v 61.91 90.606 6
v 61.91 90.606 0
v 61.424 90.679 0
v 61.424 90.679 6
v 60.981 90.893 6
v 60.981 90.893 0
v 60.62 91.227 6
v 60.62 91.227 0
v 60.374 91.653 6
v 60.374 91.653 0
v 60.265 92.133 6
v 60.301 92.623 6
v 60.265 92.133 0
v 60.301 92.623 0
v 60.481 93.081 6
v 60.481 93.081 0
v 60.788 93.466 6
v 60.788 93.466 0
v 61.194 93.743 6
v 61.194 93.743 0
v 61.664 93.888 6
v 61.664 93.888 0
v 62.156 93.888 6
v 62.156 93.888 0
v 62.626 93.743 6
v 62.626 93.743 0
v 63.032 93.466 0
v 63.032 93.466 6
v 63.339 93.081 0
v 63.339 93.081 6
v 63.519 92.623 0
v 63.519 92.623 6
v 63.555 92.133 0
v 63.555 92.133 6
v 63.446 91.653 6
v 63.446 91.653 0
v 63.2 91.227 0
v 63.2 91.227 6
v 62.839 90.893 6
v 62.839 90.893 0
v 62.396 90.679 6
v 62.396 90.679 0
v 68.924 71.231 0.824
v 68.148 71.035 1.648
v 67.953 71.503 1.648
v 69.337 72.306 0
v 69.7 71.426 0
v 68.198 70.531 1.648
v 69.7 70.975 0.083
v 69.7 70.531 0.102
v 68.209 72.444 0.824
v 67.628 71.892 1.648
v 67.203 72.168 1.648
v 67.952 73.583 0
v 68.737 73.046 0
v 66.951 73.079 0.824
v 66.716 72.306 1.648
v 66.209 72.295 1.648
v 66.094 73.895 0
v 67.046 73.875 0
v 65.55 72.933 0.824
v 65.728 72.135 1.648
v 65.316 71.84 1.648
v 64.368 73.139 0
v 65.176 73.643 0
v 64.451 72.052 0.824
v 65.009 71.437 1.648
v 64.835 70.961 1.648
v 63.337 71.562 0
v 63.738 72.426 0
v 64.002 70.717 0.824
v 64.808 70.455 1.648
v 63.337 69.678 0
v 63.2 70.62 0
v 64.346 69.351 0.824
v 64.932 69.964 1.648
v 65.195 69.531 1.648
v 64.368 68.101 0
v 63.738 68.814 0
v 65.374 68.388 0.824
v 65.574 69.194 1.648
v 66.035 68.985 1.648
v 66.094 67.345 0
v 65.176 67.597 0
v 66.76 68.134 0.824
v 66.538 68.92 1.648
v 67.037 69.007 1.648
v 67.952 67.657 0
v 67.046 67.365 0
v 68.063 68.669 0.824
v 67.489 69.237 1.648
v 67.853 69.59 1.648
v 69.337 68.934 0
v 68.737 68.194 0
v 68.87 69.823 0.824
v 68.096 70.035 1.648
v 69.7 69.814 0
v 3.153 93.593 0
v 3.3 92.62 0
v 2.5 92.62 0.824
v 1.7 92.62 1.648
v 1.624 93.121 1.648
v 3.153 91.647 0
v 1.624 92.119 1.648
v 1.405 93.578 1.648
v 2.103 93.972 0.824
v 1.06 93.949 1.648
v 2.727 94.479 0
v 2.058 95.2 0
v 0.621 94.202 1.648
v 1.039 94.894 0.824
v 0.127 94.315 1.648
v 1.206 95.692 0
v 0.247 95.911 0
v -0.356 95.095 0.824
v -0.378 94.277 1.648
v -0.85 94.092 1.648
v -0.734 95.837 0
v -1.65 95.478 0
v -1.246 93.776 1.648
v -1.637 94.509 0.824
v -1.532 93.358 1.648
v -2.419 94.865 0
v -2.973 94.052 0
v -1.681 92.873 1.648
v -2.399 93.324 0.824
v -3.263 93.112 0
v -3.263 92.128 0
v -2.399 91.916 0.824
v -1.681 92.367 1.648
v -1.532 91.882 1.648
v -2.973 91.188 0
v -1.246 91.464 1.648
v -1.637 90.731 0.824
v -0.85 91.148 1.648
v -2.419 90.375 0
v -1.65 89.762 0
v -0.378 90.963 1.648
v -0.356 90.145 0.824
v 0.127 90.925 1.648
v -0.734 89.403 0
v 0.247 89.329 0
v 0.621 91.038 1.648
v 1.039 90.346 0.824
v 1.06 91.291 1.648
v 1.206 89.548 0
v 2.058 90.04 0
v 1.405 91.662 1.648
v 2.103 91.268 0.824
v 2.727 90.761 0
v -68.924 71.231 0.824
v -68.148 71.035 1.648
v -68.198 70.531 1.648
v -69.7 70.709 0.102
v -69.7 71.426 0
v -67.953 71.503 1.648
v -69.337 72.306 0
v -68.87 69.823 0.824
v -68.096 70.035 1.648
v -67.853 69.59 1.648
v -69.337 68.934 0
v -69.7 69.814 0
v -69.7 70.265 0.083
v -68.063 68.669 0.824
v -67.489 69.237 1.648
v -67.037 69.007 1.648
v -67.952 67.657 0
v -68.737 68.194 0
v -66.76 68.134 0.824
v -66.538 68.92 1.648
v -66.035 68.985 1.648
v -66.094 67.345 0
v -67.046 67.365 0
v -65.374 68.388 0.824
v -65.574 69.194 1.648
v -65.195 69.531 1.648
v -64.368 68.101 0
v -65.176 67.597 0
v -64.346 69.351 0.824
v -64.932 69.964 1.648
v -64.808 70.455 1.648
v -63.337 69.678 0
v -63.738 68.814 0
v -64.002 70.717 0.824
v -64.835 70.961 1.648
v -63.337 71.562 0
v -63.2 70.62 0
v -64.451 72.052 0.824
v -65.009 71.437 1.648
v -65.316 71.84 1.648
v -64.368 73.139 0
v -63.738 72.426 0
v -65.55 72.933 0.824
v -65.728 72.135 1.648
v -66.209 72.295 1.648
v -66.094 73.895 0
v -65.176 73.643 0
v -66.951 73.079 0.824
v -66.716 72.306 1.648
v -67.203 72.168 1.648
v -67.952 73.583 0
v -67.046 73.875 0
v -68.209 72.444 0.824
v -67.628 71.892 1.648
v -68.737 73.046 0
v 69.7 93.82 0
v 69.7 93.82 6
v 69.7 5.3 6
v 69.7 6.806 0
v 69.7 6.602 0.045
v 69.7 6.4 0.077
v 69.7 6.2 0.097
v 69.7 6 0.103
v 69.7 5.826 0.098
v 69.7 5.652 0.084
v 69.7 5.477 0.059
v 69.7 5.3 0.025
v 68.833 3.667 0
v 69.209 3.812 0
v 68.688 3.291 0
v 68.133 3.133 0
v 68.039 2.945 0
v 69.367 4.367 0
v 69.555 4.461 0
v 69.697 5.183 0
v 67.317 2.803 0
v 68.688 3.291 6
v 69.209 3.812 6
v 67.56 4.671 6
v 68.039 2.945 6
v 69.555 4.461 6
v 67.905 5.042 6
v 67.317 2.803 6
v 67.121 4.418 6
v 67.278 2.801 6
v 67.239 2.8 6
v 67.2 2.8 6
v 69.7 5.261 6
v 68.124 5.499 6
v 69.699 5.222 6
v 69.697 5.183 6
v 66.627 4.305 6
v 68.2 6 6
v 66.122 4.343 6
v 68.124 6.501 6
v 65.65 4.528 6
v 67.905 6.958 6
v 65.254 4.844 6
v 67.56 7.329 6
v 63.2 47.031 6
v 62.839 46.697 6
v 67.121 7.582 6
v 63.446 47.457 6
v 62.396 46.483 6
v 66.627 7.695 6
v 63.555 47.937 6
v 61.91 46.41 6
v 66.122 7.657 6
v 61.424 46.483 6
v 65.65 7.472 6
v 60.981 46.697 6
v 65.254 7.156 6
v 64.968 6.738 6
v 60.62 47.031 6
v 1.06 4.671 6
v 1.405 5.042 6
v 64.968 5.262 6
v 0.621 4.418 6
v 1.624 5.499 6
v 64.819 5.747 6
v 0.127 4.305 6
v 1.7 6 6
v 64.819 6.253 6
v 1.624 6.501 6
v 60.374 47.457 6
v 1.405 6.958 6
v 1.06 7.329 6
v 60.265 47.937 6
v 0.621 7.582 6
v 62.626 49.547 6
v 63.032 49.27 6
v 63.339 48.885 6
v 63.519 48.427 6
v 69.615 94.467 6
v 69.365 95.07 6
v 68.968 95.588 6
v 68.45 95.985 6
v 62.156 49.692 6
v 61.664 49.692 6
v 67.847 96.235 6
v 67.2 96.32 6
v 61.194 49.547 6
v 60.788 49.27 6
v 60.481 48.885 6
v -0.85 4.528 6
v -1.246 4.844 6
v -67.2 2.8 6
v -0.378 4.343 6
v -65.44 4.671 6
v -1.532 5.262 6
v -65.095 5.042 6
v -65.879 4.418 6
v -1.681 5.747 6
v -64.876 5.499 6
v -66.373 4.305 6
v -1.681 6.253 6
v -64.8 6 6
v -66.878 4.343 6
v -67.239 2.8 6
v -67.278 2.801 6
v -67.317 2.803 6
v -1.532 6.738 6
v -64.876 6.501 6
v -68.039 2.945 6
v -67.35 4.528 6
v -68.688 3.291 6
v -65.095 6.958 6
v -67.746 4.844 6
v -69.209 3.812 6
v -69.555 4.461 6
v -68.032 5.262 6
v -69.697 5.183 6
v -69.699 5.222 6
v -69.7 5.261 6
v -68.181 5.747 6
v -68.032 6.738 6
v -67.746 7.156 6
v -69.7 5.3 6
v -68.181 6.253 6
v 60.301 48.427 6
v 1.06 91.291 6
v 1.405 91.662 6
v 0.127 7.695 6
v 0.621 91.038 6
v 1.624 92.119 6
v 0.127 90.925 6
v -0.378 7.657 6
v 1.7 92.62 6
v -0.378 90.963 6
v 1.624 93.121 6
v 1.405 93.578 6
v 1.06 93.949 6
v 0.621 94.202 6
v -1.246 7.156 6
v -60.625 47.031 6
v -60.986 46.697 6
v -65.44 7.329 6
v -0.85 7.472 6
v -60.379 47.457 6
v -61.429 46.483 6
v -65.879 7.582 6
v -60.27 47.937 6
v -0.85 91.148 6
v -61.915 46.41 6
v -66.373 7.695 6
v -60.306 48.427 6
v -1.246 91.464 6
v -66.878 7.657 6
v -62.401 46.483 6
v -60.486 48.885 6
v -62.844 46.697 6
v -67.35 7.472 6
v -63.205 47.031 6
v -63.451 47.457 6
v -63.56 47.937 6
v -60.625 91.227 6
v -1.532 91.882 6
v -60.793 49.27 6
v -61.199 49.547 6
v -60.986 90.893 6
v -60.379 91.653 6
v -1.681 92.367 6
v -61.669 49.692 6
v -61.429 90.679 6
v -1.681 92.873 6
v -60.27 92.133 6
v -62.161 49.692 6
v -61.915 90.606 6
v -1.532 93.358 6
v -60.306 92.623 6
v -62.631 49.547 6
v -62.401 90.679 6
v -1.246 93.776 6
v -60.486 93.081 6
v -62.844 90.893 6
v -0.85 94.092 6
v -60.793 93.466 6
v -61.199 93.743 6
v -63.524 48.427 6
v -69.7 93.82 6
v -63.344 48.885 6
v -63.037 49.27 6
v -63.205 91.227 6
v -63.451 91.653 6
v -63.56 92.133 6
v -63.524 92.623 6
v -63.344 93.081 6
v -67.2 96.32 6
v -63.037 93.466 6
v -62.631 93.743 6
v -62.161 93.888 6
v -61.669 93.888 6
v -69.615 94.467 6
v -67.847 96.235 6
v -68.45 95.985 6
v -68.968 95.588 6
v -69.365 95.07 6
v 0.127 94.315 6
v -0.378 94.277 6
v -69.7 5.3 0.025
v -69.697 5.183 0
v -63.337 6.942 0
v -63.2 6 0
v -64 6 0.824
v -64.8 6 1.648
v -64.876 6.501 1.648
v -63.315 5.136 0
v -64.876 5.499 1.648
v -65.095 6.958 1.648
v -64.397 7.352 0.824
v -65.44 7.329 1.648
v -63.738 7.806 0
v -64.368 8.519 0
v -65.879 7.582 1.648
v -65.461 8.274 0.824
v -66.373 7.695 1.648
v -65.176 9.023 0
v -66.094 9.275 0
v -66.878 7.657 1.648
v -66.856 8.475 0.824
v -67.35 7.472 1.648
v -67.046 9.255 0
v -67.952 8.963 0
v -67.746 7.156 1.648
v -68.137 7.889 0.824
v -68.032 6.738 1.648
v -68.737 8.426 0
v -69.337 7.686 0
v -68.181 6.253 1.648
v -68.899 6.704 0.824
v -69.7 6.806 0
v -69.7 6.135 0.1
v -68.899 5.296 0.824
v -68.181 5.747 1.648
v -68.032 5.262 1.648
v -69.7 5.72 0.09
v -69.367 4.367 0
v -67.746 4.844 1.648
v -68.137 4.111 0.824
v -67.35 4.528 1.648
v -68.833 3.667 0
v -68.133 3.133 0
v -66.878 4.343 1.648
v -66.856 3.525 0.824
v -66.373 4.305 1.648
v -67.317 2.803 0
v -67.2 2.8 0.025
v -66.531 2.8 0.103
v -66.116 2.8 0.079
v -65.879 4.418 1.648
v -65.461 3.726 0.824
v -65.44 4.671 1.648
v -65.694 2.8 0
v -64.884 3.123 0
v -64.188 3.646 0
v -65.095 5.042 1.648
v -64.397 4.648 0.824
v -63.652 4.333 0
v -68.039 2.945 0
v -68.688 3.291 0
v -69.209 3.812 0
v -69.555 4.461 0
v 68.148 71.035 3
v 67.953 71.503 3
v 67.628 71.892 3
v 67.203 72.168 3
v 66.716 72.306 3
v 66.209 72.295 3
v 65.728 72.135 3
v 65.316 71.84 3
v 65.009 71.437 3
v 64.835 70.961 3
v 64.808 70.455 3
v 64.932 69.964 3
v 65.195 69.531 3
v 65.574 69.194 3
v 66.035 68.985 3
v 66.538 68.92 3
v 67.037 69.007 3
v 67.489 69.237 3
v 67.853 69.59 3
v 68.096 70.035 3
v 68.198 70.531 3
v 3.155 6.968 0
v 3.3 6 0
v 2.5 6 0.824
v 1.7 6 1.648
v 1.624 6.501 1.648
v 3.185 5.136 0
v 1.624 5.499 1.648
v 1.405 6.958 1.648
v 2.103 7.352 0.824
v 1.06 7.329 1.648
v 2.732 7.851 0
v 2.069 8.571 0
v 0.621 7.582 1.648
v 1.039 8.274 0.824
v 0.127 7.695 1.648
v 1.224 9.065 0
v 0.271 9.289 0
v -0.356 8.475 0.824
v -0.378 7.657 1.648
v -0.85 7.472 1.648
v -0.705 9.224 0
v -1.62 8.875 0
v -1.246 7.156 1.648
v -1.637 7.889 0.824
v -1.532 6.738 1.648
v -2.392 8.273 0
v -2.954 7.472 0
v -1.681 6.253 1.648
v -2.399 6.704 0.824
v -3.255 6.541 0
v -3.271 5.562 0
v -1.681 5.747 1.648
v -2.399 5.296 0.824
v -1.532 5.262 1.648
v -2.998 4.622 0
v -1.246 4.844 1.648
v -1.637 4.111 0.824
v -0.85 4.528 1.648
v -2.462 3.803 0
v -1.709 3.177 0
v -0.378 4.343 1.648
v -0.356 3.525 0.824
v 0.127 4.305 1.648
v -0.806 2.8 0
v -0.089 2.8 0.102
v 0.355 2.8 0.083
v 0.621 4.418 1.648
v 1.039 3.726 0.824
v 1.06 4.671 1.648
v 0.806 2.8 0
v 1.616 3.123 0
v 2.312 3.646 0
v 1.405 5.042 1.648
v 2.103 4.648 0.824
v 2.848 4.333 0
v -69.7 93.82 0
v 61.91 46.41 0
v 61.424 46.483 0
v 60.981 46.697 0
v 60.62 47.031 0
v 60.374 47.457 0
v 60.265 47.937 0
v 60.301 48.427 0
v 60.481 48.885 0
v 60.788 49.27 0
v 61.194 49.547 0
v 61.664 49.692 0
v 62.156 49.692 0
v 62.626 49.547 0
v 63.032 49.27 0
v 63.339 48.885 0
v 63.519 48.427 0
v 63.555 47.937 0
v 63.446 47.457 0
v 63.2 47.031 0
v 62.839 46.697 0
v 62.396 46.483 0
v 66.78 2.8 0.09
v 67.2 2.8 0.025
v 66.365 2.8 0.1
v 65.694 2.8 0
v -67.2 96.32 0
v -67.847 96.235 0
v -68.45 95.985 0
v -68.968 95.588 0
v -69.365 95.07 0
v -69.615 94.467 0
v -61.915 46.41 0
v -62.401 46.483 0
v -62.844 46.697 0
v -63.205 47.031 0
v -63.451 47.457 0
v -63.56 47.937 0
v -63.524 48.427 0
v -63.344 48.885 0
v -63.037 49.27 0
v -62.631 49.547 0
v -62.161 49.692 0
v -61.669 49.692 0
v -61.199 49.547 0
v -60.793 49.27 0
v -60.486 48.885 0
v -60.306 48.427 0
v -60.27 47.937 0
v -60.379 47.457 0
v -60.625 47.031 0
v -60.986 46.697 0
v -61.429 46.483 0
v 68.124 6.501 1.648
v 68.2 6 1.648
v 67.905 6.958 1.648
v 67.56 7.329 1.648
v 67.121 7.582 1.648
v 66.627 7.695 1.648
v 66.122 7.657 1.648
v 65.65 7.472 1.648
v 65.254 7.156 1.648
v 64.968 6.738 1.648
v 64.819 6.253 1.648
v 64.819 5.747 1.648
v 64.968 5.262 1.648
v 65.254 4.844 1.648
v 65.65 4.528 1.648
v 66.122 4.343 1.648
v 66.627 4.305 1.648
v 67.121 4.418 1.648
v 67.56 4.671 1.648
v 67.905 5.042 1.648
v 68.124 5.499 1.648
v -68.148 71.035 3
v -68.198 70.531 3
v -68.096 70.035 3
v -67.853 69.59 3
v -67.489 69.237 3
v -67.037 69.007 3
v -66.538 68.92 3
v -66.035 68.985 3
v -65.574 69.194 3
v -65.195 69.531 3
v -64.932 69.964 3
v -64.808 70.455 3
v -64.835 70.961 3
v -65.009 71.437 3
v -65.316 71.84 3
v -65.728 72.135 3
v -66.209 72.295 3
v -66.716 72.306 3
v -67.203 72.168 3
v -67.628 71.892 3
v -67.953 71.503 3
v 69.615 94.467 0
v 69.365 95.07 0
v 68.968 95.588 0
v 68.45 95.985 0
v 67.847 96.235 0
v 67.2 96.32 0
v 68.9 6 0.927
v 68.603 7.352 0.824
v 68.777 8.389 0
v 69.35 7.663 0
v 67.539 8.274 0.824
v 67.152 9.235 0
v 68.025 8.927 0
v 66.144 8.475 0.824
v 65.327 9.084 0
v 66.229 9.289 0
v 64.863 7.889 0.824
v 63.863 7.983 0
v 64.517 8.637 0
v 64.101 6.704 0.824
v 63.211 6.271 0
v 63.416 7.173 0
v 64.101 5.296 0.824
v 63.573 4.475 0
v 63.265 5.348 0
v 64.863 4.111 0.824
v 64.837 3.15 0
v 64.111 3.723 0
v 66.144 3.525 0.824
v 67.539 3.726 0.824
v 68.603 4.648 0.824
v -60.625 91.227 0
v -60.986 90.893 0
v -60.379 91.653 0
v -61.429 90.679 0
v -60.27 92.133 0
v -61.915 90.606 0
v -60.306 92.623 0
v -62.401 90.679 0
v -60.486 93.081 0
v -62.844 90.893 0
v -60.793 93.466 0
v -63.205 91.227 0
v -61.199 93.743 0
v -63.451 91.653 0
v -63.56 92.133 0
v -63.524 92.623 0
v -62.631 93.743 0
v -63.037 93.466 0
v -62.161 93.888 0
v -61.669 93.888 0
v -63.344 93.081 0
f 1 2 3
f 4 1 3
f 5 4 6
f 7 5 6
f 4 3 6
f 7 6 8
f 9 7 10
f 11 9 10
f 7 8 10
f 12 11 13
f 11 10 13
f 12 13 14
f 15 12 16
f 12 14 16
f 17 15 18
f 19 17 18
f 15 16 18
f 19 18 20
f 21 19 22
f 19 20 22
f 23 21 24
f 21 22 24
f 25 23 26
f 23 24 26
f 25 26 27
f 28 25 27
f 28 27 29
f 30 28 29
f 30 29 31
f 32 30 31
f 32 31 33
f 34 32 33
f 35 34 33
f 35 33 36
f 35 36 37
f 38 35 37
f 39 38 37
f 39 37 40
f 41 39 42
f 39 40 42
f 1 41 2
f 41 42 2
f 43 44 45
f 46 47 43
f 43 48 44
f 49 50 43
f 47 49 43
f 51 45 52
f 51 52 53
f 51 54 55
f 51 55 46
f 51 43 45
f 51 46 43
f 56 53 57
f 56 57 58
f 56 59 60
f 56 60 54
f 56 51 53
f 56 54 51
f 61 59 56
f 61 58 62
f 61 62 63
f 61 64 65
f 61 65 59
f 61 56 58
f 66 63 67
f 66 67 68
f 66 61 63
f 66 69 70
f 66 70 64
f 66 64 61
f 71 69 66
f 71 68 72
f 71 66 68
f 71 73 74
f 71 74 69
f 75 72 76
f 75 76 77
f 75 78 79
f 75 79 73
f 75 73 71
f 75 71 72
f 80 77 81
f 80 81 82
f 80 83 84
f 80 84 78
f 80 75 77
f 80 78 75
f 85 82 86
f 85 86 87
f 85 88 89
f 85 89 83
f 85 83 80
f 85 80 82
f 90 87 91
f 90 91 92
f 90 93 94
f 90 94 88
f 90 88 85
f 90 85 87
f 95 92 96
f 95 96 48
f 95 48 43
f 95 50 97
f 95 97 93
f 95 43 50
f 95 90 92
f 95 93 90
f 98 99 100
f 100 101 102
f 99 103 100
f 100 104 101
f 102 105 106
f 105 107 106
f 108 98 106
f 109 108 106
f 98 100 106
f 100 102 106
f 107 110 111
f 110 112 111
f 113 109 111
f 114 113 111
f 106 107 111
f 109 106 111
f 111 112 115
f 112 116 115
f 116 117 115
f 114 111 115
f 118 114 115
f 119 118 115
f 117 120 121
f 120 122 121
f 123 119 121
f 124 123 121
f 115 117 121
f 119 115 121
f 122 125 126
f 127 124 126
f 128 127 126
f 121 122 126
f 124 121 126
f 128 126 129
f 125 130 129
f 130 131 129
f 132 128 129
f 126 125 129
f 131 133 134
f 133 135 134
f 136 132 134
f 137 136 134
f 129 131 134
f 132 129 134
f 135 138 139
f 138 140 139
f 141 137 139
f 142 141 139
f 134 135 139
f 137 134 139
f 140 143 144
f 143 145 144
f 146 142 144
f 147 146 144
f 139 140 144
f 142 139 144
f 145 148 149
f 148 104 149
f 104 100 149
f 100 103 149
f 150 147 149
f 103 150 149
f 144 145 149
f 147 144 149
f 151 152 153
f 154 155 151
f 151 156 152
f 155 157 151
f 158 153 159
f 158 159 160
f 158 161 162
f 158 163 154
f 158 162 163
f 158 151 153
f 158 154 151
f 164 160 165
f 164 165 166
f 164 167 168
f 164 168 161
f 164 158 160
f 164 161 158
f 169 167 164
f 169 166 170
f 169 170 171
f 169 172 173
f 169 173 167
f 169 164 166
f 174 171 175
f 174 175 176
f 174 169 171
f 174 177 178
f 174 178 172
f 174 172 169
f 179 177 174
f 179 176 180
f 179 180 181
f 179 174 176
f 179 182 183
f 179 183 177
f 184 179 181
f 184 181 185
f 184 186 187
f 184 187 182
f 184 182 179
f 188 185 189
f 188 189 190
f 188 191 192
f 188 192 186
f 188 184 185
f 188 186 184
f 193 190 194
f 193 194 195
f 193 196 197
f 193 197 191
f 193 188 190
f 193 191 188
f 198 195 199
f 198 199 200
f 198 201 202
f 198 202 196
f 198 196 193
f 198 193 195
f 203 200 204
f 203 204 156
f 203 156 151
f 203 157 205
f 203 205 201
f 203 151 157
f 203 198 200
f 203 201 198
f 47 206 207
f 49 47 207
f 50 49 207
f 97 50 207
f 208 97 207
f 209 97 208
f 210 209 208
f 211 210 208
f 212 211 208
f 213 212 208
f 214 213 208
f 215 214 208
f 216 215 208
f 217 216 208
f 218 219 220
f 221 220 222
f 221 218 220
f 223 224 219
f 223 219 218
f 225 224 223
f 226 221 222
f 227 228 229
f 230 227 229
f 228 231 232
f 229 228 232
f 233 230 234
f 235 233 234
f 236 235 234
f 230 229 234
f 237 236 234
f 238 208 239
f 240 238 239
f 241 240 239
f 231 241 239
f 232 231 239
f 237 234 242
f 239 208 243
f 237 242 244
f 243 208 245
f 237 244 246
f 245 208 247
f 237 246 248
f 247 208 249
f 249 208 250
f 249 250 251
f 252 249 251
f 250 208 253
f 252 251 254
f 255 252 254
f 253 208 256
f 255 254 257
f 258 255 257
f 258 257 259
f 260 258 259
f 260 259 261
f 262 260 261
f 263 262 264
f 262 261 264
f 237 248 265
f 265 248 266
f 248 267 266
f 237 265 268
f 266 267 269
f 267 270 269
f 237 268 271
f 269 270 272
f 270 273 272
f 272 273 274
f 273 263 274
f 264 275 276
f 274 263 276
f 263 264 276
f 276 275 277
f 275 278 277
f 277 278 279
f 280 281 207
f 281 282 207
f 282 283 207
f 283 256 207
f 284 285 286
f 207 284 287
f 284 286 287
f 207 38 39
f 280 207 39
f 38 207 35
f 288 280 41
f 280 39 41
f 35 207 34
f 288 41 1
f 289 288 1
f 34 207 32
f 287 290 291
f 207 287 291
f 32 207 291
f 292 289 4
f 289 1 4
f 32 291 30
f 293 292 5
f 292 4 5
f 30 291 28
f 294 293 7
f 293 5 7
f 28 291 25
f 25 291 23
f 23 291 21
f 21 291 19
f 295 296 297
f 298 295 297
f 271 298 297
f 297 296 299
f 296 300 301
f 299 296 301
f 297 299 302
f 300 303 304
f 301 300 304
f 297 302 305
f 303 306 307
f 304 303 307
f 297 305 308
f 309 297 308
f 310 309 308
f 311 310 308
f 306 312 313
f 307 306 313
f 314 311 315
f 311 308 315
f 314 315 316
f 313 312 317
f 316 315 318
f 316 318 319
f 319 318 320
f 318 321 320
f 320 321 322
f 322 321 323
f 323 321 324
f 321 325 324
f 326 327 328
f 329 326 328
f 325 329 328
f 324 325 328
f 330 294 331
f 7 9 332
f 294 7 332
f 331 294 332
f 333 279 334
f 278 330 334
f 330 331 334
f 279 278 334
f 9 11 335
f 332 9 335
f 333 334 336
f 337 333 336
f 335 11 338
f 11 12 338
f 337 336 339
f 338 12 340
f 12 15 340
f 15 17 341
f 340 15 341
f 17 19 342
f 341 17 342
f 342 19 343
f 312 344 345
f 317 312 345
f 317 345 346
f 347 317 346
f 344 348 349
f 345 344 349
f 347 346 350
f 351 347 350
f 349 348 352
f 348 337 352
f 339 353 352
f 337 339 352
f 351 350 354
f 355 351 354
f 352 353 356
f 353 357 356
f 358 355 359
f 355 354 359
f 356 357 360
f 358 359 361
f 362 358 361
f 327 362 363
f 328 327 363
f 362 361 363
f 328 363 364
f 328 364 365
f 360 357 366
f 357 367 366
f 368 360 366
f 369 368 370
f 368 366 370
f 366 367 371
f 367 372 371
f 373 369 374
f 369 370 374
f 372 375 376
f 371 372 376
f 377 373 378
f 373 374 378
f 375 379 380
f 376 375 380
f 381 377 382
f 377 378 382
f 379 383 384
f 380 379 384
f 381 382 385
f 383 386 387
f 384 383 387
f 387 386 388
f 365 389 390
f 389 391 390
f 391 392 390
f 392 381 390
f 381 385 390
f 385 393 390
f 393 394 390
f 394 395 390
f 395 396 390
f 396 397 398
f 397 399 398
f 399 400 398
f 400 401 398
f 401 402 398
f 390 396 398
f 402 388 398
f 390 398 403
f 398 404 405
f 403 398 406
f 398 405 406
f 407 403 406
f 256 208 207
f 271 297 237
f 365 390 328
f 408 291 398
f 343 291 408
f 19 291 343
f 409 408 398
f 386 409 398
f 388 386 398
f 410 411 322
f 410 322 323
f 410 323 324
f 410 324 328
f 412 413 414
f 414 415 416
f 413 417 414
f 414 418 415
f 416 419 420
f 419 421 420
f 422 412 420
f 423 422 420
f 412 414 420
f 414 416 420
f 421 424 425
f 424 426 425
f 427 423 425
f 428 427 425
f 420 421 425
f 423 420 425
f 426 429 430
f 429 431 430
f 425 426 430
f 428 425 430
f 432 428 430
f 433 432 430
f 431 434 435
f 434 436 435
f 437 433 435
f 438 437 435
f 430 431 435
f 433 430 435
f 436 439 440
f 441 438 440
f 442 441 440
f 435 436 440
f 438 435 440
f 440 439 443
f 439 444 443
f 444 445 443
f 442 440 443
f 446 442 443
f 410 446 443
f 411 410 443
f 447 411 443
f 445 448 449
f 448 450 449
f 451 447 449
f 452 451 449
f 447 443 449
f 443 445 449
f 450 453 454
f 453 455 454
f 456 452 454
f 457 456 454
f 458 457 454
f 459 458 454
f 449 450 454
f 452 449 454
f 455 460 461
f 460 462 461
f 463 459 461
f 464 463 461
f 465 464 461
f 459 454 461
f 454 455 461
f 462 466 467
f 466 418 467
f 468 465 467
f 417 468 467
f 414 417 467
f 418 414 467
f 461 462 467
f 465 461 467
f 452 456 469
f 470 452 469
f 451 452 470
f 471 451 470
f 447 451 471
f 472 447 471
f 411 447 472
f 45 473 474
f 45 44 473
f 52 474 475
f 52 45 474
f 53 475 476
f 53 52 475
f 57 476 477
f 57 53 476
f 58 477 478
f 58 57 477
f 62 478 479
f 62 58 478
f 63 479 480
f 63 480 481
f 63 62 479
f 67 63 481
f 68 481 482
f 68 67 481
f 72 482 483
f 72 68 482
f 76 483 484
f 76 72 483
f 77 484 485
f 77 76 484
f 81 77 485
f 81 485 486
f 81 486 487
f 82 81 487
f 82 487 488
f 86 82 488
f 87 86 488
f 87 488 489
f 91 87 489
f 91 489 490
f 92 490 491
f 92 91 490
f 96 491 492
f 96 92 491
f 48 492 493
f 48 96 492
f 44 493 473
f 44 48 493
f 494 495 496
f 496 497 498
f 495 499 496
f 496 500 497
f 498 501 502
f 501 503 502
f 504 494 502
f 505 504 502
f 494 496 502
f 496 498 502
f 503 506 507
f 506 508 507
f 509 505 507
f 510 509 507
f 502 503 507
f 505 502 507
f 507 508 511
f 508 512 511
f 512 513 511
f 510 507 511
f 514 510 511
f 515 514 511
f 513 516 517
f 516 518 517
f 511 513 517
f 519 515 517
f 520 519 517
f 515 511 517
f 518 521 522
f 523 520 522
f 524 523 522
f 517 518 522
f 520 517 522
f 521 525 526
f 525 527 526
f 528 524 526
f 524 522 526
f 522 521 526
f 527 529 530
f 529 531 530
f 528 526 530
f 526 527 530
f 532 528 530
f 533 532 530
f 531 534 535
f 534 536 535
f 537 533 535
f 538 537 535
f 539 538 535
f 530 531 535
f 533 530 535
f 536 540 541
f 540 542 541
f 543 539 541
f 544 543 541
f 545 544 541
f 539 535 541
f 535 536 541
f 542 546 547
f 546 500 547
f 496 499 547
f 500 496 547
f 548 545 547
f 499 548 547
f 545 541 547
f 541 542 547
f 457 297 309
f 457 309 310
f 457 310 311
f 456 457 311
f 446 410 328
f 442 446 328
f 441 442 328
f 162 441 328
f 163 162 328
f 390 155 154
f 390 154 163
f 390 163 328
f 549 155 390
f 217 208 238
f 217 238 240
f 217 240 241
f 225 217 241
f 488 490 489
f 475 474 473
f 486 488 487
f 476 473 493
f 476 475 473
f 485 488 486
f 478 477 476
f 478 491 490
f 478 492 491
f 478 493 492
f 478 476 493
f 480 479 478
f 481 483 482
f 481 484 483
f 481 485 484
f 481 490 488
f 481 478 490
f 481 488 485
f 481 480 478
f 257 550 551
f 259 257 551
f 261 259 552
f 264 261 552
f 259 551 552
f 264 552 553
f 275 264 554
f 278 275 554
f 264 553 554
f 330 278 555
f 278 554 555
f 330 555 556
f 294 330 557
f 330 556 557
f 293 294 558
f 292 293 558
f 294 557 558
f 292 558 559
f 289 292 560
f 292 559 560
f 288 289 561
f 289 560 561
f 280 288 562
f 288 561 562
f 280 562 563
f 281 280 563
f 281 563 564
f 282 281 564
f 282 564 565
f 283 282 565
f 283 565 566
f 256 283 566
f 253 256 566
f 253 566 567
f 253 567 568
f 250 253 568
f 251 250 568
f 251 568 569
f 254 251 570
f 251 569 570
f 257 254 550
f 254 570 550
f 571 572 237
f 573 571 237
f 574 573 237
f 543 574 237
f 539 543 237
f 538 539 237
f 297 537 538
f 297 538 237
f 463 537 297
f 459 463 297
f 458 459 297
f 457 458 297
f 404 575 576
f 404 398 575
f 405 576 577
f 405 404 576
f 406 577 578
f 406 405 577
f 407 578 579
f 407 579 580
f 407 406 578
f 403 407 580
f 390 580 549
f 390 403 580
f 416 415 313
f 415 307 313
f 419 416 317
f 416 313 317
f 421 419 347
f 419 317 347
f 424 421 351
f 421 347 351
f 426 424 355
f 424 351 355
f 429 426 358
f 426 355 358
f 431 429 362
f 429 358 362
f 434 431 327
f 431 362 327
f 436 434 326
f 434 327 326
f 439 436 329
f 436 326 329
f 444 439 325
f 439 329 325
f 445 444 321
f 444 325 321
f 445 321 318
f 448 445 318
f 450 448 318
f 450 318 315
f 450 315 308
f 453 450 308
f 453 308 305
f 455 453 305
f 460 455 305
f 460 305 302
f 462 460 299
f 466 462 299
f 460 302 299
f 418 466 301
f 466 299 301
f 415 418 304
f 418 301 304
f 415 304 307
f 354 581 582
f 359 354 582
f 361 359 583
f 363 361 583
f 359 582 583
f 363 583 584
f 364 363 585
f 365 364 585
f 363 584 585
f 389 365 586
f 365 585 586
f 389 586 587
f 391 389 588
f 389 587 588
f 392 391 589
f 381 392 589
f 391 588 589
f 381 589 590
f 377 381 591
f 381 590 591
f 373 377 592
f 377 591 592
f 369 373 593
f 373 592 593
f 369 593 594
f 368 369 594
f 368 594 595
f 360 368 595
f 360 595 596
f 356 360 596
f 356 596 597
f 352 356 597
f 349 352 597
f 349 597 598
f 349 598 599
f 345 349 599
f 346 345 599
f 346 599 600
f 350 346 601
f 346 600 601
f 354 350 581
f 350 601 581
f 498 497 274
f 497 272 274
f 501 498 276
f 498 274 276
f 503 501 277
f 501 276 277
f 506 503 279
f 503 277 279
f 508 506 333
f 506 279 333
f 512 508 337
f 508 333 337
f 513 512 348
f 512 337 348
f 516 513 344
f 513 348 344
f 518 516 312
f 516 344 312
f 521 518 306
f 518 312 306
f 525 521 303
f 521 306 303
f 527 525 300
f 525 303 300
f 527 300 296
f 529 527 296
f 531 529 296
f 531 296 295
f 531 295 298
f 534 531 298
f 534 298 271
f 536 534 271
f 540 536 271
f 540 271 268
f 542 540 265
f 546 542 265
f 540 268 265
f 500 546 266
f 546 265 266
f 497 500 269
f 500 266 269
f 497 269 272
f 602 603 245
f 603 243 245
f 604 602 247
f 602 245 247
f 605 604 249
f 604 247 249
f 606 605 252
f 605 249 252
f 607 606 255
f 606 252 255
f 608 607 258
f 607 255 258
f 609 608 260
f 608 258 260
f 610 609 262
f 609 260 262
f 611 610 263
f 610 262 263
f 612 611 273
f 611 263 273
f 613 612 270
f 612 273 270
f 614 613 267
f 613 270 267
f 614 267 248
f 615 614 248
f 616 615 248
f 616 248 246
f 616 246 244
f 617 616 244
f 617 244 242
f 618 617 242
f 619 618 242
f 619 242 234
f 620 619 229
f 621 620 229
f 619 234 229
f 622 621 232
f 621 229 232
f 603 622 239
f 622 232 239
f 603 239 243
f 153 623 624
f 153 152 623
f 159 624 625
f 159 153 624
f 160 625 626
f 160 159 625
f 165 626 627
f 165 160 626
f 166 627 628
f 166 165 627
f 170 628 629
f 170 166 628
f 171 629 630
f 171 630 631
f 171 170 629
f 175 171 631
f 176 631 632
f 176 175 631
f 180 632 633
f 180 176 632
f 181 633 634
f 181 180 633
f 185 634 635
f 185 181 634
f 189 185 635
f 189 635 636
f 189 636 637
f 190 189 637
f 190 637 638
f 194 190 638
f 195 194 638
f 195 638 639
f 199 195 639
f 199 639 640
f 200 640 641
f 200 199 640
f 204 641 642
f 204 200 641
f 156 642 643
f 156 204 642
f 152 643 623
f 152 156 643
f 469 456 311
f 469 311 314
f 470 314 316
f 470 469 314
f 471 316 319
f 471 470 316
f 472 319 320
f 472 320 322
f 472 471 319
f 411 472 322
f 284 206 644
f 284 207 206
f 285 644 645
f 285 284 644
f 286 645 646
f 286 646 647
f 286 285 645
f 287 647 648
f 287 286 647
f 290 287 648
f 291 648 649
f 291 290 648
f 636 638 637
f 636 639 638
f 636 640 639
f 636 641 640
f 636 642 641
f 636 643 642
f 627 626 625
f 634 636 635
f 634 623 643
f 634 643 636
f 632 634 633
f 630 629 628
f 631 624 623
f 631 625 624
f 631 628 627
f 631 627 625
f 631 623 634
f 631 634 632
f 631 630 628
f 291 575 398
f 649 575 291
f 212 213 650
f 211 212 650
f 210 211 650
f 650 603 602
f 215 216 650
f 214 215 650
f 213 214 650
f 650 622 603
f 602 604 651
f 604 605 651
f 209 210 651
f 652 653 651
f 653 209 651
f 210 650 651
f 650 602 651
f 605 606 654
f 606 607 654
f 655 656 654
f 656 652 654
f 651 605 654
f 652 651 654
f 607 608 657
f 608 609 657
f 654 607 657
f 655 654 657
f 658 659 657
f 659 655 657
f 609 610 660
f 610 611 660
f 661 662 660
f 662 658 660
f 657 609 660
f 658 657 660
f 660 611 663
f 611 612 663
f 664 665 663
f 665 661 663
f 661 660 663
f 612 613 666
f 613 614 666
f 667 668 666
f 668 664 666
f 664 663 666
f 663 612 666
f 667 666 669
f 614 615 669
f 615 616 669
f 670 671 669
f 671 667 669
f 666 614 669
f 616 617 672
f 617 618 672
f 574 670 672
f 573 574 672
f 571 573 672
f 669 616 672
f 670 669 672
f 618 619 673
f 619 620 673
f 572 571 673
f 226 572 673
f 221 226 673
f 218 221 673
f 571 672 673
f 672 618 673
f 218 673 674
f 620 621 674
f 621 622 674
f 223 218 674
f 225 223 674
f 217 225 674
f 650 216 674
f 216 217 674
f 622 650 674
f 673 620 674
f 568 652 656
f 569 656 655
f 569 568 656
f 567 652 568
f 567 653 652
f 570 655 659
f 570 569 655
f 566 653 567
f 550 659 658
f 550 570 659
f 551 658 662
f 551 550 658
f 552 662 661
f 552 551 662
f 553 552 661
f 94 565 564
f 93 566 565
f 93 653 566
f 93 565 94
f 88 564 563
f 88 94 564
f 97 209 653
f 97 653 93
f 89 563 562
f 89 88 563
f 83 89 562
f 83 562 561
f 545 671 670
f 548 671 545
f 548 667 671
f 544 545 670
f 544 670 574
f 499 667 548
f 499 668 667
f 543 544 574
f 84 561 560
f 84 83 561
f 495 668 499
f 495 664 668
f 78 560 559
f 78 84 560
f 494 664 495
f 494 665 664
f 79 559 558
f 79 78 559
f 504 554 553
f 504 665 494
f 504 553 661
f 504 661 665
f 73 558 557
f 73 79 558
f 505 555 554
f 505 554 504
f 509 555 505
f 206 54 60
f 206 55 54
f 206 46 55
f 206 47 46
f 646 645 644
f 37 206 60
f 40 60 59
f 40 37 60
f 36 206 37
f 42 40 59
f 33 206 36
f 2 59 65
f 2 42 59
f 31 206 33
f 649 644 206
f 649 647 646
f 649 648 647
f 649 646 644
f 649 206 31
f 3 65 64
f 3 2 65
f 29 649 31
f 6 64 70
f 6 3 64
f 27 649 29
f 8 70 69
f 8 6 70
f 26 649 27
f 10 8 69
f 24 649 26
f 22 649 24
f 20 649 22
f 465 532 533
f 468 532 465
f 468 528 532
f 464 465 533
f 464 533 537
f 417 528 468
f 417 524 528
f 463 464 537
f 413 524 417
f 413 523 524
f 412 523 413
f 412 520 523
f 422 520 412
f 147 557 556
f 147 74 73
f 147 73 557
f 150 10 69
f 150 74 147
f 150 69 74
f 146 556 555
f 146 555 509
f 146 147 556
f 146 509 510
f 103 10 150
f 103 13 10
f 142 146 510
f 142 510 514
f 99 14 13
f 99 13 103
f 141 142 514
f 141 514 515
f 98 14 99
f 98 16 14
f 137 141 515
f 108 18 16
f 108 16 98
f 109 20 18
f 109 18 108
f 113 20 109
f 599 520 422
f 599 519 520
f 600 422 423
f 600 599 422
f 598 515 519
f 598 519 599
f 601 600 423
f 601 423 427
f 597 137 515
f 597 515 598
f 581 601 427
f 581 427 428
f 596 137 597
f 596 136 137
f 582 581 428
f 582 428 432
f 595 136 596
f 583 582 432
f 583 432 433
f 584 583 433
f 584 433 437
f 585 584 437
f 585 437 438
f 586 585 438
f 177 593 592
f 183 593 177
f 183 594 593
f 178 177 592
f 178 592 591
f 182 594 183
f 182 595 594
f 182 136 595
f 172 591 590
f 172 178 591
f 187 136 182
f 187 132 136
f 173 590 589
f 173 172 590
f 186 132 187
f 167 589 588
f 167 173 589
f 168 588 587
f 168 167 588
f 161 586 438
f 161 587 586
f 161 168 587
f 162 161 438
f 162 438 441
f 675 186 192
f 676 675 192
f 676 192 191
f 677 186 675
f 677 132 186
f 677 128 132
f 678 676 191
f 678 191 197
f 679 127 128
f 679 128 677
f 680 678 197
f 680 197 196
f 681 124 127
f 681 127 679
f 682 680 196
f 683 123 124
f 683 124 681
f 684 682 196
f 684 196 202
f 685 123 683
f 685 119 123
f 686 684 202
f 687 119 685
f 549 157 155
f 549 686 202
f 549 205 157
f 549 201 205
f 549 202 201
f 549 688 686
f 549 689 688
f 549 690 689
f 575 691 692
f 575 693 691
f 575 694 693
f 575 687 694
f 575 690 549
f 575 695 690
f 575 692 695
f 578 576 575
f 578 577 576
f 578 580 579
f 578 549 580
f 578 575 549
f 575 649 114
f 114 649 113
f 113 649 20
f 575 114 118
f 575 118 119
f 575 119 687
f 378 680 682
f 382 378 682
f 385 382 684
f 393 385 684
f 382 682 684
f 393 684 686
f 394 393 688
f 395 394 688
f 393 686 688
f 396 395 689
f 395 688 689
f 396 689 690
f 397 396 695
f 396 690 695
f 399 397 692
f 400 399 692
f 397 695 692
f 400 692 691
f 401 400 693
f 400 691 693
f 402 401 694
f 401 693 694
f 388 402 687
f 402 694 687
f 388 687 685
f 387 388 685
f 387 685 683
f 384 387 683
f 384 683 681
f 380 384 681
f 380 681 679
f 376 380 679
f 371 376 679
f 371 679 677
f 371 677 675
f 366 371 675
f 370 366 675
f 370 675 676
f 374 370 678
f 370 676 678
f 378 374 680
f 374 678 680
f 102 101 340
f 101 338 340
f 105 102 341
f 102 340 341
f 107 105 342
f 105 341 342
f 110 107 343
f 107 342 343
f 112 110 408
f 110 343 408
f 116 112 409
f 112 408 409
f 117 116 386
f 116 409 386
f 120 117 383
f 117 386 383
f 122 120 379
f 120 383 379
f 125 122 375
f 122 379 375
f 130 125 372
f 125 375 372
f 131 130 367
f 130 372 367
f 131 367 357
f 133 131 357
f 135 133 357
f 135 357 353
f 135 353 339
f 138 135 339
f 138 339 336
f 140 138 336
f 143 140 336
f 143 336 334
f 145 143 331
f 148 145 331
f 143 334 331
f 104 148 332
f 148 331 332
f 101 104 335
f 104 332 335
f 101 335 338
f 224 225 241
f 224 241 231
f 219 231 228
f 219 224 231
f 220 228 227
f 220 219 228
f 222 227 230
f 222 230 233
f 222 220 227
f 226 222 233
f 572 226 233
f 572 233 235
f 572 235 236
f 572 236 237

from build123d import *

# Parameters (mm, degrees)
BOSS_EXTRUDE1_DEPTH                               = 6
SKETCH8_W                                         = 4
SKETCH8_H                                         = 14
SKETCH9_W                                         = 4
SKETCH9_H                                         = 14
SKETCH10_W                                        = 4
SKETCH10_H                                        = 14
SKETCH11_W                                        = 4
SKETCH11_H                                        = 14
CSK_FOR_4_FLAT_HEAD_MACHINE_SCREW_100_D           = 3.4
CSK_FOR_4_FLAT_HEAD_MACHINE_SCREW_100_DEPTH       = 17
CSK_FOR_4_FLAT_HEAD_MACHINE_SCREW_100_CSINK_D     = 6.6
CSK_FOR_4_FLAT_HEAD_MACHINE_SCREW_100_CSINK_ANGLE = 88.289805
F_6_CLEARANCE_HOLE1_D                             = 4.2
F_6_CLEARANCE_HOLE1_DEPTH                         = 6
FILLET2_R                                         = 2.5
SKETCH19_W                                        = 1.65
SKETCH19_H                                        = 6.0002
M4X0_7_TAPPED_HOLE1_AT_2_COUNT                    = 2
M4X0_7_TAPPED_HOLE1_AT_2_PITCH                    = 44.196
M4X0_7_TAPPED_HOLE1_AT_3_COUNT                    = 2
M4X0_7_TAPPED_HOLE1_AT_3_PITCH                    = 131.475918103
M4X0_7_TAPPED_HOLE1_AT_4_COUNT                    = 2
M4X0_7_TAPPED_HOLE1_AT_4_PITCH                    = 123.825
SKETCH20_W                                        = 161.59397274
SKETCH20_H                                        = 68.078942219
CUT_EXTRUDE1_DEPTH                                = 120.401140756


with BuildPart() as part:
    # Sketch1 → Boss-Extrude1 (new body)
    with BuildSketch(Plane(origin=(0, 0, 0), x_dir=(-1, 0, 0), z_dir=(0, 0, -1))):
        with BuildLine():
            Line((-69.7, 93.82), (-69.7, 71.426225775))
            Line((-69.7, 71.426225775), (-69.7, 69.813774225))
            Line((-69.7, 69.813774225), (-69.7, 6.806225775))
            Line((-69.7, 6.806225775), (-69.7, 5.3))
            ThreePointArc((-69.7, 5.3), (-69.699314773, 5.241470835), (-69.69725947, 5.182973755))
            ThreePointArc((-69.69725947, 5.182973755), (-68.967766953, 3.532233047), (-67.317026245, 2.80274053))
            ThreePointArc((-67.317026245, 2.80274053), (-67.258529165, 2.800685227), (-67.2, 2.8))
            Line((-67.2, 2.8), (-65.693774225, 2.8))
            Line((-65.693774225, 2.8), (-0.806225775, 2.8))
            Line((-0.806225775, 2.8), (0.806225775, 2.8))
            Line((0.806225775, 2.8), (65.693774225, 2.8))
            Line((65.693774225, 2.8), (67.2, 2.8))
            ThreePointArc((67.2, 2.8), (67.258529165, 2.800685227), (67.317026245, 2.80274053))
            ThreePointArc((67.317026245, 2.80274053), (68.967766953, 3.532233047), (69.69725947, 5.182973755))
            ThreePointArc((69.69725947, 5.182973755), (69.699314773, 5.241470835), (69.7, 5.3))
            Line((69.7, 5.3), (69.7, 6.806225775))
            Line((69.7, 6.806225775), (69.7, 69.813774225))
            Line((69.7, 69.813774225), (69.7, 71.426225775))
            Line((69.7, 71.426225775), (69.7, 93.82))
            Line((69.7, 93.82), (69.7, 96.32))
            Line((69.7, 96.32), (67.2, 96.32))
            Line((67.2, 96.32), (-67.2, 96.32))
            Line((-67.2, 96.32), (-69.7, 96.32))
            Line((-69.7, 96.32), (-69.7, 93.82))
        make_face()
    extrude(amount=-BOSS_EXTRUDE1_DEPTH)

    # Sketch2 → Cut-Revolve1 (revolve, cut)
    with BuildSketch(Plane(origin=(0, 70.62, 0), x_dir=(1, 0, 0), z_dir=(0, 1, 0)), mode=Mode.PRIVATE) as cut_revolve1_sk:
        Polygon((69.800194118, 0.0002), (66.5, 0.0002), (66.5, -3), (68.2, -3), (68.2, -1.648484848), align=None)
    revolve(cut_revolve1_sk.sketch.rotate(Axis((66.5, 70.62, -0.0002), (0, 0, 1)), 14.141110809), axis=Axis((66.5, 70.62, -0.0002), (0, 0, 1)), mode=Mode.SUBTRACT)

    # Sketch3 → Cut-Revolve2 (revolve, cut)
    with BuildSketch(Plane(origin=(0, 70.62, 0), x_dir=(1, 0, 0), z_dir=(0, 1, 0)), mode=Mode.PRIVATE) as cut_revolve2_sk:
        Polygon((-63.199805882, 0.0002), (-66.5, 0.0002), (-66.5, -3), (-64.8, -3), (-64.8, -1.648484848), align=None)
    revolve(cut_revolve2_sk.sketch.rotate(Axis((-66.5, 70.62, -0.0002), (0, 0, 1)), 165.858889766), axis=Axis((-66.5, 70.62, -0.0002), (0, 0, 1)), mode=Mode.SUBTRACT)

    # Sketch8 → Revolve5 (revolve)
    with BuildSketch(Plane.XZ.offset(-92.256), mode=Mode.PRIVATE) as revolve5_sk:
        with Locations((63.91, 10)):
            Rectangle(SKETCH8_W, SKETCH8_H)
    revolve(revolve5_sk.sketch.rotate(Axis((61.91, 92.256, 17.005), (0, 0, -1)), 180), axis=Axis((61.91, 92.256, 17.005), (0, 0, -1)))

    # Sketch9 → Revolve6 (revolve)
    with BuildSketch(Plane.XZ.offset(-92.256), mode=Mode.PRIVATE) as revolve6_sk:
        with Locations((-59.915, 10)):
            Rectangle(SKETCH9_W, SKETCH9_H)
    revolve(revolve6_sk.sketch.rotate(Axis((-61.915, 92.256, 17.005), (0, 0, -1)), 180), axis=Axis((-61.915, 92.256, 17.005), (0, 0, -1)))

    # Sketch10 → Revolve7 (revolve)
    with BuildSketch(Plane.XZ.offset(-48.06), mode=Mode.PRIVATE) as revolve7_sk:
        with Locations((63.91, 10)):
            Rectangle(SKETCH10_W, SKETCH10_H)
    revolve(revolve7_sk.sketch.rotate(Axis((61.91, 48.06, 17.005), (0, 0, -1)), 180), axis=Axis((61.91, 48.06, 17.005), (0, 0, -1)))

    # Sketch11 → Revolve8 (revolve)
    with BuildSketch(Plane.XZ.offset(-48.06), mode=Mode.PRIVATE) as revolve8_sk:
        with Locations((-59.915, 10)):
            Rectangle(SKETCH11_W, SKETCH11_H)
    revolve(revolve8_sk.sketch.rotate(Axis((-61.915, 48.06, 17.005), (0, 0, -1)), 180), axis=Axis((-61.915, 48.06, 17.005), (0, 0, -1)))

    # CSK for #4 Flat Head Machine Screw (100)1
    with Locations(Plane(origin=(0, 0, 0), x_dir=(-1, 0, 0), z_dir=(0, 0, -1))):
        with Locations((66.5, 6), (0, 6), (-66.5, 6), (0, 92.62)):
            CounterSinkHole(CSK_FOR_4_FLAT_HEAD_MACHINE_SCREW_100_D / 2, CSK_FOR_4_FLAT_HEAD_MACHINE_SCREW_100_CSINK_D / 2, depth=CSK_FOR_4_FLAT_HEAD_MACHINE_SCREW_100_DEPTH, counter_sink_angle=CSK_FOR_4_FLAT_HEAD_MACHINE_SCREW_100_CSINK_ANGLE)

    # #6 Clearance Hole1
    with Locations(Plane.XY.offset(17)):
        with Locations((-61.915, 48.06), (61.91, 48.06), (-61.915, 92.256), (61.91, 92.256)):
            Hole(F_6_CLEARANCE_HOLE1_D / 2, depth=F_6_CLEARANCE_HOLE1_DEPTH)

    # Fillet2
    fillet2_edges = [part.edges().sort_by_distance(p)[0] for p in [
        (69.7, 96.32, 3),
        (-69.7, 96.32, 3),
    ]]
    fillet(fillet2_edges, radius=FILLET2_R)

    # Sketch19 → M4x0.7 Tapped Hole1 (revolve, cut)
    with BuildSketch(Plane(origin=(-61.915, 48.06, 6), x_dir=(0, -1, 0), z_dir=(1, 0, 0))):
        with Locations((0.825, 3.0001)):
            Rectangle(SKETCH19_W, SKETCH19_H)
    m4x0_7_tapped_hole1 = revolve(axis=Axis((-61.915, 48.06, 12.35), (0, 0, -1)), mode=Mode.SUBTRACT)

    # M4x0.7 Tapped Hole1 at 2: M4x0.7 Tapped Hole1 ×2
    with Locations(*[(0, i * M4X0_7_TAPPED_HOLE1_AT_2_PITCH, 0) for i in range(1, M4X0_7_TAPPED_HOLE1_AT_2_COUNT)]):
        add(m4x0_7_tapped_hole1, mode=Mode.SUBTRACT)

    # M4x0.7 Tapped Hole1 at 3: M4x0.7 Tapped Hole1 ×2
    with Locations(*[Vector(0.941807456351738, 0.3361528151901589, 0) * (i * M4X0_7_TAPPED_HOLE1_AT_3_PITCH) for i in range(1, M4X0_7_TAPPED_HOLE1_AT_3_COUNT)]):
        add(m4x0_7_tapped_hole1, mode=Mode.SUBTRACT)

    # M4x0.7 Tapped Hole1 at 4: M4x0.7 Tapped Hole1 ×2
    with Locations(*[(i * M4X0_7_TAPPED_HOLE1_AT_4_PITCH, 0, 0) for i in range(1, M4X0_7_TAPPED_HOLE1_AT_4_COUNT)]):
        add(m4x0_7_tapped_hole1, mode=Mode.SUBTRACT)

    # Sketch20 → Cut-Extrude1 (cut, through all)
    with BuildSketch(Plane.XY.offset(6)):
        with Locations((-0.997493659, 67.826602629)):
            Rectangle(SKETCH20_W, SKETCH20_H)
    extrude(amount=CUT_EXTRUDE1_DEPTH, mode=Mode.SUBTRACT)


solid = part.part
